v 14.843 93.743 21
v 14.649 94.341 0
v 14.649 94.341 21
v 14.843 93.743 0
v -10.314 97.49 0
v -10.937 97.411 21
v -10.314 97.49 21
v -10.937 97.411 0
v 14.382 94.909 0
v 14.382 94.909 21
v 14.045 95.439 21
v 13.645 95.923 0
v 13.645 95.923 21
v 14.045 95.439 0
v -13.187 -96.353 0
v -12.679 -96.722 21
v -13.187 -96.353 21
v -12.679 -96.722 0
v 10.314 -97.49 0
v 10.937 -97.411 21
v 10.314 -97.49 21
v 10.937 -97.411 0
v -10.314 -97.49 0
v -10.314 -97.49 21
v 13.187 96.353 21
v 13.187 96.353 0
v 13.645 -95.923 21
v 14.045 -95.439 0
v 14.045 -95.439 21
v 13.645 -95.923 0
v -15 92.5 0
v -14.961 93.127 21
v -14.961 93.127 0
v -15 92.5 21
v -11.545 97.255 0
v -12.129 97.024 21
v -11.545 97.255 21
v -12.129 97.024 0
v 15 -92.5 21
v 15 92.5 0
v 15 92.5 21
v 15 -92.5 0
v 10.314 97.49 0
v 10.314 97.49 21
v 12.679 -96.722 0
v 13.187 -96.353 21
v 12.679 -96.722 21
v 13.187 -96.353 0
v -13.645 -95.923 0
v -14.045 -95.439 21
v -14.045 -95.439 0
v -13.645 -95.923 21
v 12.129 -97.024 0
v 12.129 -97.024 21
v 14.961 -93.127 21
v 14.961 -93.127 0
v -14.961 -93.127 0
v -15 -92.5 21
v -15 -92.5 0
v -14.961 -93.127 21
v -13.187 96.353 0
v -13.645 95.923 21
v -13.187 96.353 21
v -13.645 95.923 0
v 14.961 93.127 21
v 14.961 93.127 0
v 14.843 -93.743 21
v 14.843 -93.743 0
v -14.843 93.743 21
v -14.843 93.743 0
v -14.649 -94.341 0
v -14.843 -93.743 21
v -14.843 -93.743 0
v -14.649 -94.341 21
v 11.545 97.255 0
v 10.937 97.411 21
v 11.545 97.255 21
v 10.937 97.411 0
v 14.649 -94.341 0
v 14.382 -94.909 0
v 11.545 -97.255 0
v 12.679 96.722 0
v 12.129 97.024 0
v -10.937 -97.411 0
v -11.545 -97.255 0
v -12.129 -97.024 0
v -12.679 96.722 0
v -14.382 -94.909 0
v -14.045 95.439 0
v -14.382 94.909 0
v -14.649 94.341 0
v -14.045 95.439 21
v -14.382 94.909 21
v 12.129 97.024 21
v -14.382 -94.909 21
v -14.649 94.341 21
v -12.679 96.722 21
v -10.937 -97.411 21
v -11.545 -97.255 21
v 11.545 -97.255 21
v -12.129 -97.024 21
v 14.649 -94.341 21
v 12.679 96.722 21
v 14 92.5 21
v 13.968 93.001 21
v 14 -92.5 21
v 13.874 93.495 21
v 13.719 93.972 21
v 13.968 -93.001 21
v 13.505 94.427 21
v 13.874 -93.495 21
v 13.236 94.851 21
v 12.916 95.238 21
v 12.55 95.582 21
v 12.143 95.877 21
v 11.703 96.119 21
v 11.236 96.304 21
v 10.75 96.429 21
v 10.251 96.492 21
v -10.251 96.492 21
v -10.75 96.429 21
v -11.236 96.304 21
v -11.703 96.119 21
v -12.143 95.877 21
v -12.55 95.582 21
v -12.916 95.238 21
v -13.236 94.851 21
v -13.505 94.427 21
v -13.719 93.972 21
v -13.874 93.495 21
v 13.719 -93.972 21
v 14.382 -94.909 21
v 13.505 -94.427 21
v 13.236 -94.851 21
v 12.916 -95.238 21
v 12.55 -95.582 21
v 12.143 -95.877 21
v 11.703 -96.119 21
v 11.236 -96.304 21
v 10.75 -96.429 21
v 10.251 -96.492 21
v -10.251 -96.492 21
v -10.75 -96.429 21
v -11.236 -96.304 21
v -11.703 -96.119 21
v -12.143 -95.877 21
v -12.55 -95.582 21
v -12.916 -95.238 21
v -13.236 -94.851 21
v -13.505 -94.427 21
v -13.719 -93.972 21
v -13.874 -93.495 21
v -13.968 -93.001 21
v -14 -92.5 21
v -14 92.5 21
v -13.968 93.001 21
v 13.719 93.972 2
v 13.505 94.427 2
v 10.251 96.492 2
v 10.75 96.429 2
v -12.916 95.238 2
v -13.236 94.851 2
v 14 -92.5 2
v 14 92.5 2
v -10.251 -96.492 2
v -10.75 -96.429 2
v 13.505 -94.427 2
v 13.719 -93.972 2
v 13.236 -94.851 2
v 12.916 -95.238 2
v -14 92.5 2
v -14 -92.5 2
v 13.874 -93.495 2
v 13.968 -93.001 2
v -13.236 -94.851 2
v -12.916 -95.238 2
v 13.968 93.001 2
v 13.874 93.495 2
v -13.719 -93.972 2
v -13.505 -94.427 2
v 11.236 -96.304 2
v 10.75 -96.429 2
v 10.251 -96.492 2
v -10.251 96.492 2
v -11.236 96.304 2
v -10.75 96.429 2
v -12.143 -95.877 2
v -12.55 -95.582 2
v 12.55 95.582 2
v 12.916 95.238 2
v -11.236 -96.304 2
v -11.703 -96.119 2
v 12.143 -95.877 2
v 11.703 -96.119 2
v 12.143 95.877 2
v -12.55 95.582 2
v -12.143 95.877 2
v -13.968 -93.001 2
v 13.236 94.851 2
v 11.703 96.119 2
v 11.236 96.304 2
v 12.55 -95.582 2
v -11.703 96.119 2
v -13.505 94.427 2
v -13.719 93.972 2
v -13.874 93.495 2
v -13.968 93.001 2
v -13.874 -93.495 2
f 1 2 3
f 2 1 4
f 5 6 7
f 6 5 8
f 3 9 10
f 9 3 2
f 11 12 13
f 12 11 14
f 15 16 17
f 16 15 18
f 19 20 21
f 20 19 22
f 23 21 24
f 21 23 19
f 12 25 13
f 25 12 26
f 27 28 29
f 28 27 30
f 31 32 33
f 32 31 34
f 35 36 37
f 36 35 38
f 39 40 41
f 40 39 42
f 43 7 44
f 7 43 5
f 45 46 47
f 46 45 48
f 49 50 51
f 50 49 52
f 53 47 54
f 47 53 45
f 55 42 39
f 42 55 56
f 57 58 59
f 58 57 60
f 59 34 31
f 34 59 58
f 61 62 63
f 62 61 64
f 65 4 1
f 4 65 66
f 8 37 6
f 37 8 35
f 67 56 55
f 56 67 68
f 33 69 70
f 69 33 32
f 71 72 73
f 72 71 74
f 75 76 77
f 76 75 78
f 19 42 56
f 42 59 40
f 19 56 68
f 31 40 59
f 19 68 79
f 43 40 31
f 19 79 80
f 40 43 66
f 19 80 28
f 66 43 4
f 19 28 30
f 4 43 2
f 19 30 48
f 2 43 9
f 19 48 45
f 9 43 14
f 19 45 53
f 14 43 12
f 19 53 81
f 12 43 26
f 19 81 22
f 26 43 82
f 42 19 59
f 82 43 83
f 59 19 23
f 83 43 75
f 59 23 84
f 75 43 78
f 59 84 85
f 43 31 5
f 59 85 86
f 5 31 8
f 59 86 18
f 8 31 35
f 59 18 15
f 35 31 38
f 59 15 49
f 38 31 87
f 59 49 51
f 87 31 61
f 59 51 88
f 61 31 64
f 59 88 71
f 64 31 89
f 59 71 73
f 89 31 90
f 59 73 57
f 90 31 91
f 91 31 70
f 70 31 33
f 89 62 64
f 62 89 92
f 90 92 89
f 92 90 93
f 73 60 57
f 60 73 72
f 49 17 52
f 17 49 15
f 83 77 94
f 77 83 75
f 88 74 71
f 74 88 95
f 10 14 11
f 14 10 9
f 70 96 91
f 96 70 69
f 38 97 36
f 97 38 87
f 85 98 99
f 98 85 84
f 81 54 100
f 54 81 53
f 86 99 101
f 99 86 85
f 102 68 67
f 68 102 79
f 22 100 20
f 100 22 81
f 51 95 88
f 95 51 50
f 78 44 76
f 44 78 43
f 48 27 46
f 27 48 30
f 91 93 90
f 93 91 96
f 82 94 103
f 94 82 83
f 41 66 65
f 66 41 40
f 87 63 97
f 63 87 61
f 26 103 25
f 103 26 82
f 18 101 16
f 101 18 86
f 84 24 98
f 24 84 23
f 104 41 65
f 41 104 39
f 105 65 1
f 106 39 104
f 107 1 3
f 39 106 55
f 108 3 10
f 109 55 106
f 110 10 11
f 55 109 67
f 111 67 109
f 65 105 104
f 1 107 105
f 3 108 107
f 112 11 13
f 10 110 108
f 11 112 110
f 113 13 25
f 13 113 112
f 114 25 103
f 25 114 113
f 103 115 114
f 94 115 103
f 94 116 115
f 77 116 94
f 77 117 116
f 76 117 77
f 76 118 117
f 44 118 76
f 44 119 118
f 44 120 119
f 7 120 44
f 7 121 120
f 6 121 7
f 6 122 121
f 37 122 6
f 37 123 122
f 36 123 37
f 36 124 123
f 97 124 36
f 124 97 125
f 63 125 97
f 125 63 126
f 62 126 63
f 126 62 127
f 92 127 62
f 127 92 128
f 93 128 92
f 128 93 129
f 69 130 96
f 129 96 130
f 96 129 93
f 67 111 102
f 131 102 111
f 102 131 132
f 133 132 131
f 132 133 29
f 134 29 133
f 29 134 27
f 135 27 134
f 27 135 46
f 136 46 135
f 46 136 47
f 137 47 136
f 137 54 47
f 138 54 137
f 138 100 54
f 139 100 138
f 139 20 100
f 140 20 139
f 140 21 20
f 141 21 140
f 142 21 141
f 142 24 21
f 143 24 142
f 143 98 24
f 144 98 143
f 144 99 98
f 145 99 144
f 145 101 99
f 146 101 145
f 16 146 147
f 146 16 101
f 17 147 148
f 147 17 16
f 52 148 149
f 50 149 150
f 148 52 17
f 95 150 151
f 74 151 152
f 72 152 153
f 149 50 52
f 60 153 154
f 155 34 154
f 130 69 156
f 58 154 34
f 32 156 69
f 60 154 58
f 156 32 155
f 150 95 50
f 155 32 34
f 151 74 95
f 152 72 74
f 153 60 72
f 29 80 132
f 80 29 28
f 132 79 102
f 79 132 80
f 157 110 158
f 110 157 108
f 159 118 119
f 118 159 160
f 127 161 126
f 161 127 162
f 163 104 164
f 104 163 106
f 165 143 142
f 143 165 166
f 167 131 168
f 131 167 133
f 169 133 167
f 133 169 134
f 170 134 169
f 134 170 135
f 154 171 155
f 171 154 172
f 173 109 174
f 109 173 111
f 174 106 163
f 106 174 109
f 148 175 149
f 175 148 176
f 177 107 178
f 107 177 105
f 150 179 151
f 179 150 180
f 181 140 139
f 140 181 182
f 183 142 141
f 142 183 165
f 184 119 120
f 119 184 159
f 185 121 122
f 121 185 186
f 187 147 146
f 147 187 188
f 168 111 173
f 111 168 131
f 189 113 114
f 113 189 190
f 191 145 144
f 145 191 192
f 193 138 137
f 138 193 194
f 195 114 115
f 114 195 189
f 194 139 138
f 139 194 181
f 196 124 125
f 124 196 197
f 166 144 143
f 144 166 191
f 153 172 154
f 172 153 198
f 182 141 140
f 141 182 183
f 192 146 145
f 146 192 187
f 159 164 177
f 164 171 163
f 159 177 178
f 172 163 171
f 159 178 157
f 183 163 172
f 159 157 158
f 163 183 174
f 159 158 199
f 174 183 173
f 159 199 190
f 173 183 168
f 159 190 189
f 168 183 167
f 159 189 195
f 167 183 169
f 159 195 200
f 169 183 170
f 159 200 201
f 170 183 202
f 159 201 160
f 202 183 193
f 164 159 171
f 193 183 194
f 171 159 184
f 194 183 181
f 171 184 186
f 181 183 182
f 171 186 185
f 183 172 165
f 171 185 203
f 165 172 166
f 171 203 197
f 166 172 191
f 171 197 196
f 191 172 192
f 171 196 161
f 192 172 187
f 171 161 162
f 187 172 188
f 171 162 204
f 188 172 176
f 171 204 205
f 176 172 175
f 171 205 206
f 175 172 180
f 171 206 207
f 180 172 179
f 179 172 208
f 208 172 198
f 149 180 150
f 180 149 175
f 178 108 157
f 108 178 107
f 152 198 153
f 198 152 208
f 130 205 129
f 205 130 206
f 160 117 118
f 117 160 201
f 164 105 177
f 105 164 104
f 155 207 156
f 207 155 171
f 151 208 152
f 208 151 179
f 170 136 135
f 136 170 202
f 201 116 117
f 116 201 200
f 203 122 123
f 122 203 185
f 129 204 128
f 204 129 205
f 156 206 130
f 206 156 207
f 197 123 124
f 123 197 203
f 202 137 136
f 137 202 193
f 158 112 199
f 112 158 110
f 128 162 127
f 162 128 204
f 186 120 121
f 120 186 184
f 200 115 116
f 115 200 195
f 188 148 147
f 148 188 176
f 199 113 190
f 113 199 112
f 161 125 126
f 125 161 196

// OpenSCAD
$fn = 50;


difference() {
	union() {
		hull() {
			translate(v = [-10.0000000000, 92.5000000000, 0]) {
				cylinder(h = 21, r = 5);
			}
			translate(v = [10.0000000000, 92.5000000000, 0]) {
				cylinder(h = 21, r = 5);
			}
			translate(v = [-10.0000000000, -92.5000000000, 0]) {
				cylinder(h = 21, r = 5);
			}
			translate(v = [10.0000000000, -92.5000000000, 0]) {
				cylinder(h = 21, r = 5);
			}
		}
	}
	union() {
		translate(v = [0, 0, 2]) {
			hull() {
				translate(v = [-10.0000000000, 92.5000000000, 0]) {
					cylinder(h = 19, r = 4);
				}
				translate(v = [10.0000000000, 92.5000000000, 0]) {
					cylinder(h = 19, r = 4);
				}
				translate(v = [-10.0000000000, -92.5000000000, 0]) {
					cylinder(h = 19, r = 4);
				}
				translate(v = [10.0000000000, -92.5000000000, 0]) {
					cylinder(h = 19, r = 4);
				}
			}
		}
	}
}
